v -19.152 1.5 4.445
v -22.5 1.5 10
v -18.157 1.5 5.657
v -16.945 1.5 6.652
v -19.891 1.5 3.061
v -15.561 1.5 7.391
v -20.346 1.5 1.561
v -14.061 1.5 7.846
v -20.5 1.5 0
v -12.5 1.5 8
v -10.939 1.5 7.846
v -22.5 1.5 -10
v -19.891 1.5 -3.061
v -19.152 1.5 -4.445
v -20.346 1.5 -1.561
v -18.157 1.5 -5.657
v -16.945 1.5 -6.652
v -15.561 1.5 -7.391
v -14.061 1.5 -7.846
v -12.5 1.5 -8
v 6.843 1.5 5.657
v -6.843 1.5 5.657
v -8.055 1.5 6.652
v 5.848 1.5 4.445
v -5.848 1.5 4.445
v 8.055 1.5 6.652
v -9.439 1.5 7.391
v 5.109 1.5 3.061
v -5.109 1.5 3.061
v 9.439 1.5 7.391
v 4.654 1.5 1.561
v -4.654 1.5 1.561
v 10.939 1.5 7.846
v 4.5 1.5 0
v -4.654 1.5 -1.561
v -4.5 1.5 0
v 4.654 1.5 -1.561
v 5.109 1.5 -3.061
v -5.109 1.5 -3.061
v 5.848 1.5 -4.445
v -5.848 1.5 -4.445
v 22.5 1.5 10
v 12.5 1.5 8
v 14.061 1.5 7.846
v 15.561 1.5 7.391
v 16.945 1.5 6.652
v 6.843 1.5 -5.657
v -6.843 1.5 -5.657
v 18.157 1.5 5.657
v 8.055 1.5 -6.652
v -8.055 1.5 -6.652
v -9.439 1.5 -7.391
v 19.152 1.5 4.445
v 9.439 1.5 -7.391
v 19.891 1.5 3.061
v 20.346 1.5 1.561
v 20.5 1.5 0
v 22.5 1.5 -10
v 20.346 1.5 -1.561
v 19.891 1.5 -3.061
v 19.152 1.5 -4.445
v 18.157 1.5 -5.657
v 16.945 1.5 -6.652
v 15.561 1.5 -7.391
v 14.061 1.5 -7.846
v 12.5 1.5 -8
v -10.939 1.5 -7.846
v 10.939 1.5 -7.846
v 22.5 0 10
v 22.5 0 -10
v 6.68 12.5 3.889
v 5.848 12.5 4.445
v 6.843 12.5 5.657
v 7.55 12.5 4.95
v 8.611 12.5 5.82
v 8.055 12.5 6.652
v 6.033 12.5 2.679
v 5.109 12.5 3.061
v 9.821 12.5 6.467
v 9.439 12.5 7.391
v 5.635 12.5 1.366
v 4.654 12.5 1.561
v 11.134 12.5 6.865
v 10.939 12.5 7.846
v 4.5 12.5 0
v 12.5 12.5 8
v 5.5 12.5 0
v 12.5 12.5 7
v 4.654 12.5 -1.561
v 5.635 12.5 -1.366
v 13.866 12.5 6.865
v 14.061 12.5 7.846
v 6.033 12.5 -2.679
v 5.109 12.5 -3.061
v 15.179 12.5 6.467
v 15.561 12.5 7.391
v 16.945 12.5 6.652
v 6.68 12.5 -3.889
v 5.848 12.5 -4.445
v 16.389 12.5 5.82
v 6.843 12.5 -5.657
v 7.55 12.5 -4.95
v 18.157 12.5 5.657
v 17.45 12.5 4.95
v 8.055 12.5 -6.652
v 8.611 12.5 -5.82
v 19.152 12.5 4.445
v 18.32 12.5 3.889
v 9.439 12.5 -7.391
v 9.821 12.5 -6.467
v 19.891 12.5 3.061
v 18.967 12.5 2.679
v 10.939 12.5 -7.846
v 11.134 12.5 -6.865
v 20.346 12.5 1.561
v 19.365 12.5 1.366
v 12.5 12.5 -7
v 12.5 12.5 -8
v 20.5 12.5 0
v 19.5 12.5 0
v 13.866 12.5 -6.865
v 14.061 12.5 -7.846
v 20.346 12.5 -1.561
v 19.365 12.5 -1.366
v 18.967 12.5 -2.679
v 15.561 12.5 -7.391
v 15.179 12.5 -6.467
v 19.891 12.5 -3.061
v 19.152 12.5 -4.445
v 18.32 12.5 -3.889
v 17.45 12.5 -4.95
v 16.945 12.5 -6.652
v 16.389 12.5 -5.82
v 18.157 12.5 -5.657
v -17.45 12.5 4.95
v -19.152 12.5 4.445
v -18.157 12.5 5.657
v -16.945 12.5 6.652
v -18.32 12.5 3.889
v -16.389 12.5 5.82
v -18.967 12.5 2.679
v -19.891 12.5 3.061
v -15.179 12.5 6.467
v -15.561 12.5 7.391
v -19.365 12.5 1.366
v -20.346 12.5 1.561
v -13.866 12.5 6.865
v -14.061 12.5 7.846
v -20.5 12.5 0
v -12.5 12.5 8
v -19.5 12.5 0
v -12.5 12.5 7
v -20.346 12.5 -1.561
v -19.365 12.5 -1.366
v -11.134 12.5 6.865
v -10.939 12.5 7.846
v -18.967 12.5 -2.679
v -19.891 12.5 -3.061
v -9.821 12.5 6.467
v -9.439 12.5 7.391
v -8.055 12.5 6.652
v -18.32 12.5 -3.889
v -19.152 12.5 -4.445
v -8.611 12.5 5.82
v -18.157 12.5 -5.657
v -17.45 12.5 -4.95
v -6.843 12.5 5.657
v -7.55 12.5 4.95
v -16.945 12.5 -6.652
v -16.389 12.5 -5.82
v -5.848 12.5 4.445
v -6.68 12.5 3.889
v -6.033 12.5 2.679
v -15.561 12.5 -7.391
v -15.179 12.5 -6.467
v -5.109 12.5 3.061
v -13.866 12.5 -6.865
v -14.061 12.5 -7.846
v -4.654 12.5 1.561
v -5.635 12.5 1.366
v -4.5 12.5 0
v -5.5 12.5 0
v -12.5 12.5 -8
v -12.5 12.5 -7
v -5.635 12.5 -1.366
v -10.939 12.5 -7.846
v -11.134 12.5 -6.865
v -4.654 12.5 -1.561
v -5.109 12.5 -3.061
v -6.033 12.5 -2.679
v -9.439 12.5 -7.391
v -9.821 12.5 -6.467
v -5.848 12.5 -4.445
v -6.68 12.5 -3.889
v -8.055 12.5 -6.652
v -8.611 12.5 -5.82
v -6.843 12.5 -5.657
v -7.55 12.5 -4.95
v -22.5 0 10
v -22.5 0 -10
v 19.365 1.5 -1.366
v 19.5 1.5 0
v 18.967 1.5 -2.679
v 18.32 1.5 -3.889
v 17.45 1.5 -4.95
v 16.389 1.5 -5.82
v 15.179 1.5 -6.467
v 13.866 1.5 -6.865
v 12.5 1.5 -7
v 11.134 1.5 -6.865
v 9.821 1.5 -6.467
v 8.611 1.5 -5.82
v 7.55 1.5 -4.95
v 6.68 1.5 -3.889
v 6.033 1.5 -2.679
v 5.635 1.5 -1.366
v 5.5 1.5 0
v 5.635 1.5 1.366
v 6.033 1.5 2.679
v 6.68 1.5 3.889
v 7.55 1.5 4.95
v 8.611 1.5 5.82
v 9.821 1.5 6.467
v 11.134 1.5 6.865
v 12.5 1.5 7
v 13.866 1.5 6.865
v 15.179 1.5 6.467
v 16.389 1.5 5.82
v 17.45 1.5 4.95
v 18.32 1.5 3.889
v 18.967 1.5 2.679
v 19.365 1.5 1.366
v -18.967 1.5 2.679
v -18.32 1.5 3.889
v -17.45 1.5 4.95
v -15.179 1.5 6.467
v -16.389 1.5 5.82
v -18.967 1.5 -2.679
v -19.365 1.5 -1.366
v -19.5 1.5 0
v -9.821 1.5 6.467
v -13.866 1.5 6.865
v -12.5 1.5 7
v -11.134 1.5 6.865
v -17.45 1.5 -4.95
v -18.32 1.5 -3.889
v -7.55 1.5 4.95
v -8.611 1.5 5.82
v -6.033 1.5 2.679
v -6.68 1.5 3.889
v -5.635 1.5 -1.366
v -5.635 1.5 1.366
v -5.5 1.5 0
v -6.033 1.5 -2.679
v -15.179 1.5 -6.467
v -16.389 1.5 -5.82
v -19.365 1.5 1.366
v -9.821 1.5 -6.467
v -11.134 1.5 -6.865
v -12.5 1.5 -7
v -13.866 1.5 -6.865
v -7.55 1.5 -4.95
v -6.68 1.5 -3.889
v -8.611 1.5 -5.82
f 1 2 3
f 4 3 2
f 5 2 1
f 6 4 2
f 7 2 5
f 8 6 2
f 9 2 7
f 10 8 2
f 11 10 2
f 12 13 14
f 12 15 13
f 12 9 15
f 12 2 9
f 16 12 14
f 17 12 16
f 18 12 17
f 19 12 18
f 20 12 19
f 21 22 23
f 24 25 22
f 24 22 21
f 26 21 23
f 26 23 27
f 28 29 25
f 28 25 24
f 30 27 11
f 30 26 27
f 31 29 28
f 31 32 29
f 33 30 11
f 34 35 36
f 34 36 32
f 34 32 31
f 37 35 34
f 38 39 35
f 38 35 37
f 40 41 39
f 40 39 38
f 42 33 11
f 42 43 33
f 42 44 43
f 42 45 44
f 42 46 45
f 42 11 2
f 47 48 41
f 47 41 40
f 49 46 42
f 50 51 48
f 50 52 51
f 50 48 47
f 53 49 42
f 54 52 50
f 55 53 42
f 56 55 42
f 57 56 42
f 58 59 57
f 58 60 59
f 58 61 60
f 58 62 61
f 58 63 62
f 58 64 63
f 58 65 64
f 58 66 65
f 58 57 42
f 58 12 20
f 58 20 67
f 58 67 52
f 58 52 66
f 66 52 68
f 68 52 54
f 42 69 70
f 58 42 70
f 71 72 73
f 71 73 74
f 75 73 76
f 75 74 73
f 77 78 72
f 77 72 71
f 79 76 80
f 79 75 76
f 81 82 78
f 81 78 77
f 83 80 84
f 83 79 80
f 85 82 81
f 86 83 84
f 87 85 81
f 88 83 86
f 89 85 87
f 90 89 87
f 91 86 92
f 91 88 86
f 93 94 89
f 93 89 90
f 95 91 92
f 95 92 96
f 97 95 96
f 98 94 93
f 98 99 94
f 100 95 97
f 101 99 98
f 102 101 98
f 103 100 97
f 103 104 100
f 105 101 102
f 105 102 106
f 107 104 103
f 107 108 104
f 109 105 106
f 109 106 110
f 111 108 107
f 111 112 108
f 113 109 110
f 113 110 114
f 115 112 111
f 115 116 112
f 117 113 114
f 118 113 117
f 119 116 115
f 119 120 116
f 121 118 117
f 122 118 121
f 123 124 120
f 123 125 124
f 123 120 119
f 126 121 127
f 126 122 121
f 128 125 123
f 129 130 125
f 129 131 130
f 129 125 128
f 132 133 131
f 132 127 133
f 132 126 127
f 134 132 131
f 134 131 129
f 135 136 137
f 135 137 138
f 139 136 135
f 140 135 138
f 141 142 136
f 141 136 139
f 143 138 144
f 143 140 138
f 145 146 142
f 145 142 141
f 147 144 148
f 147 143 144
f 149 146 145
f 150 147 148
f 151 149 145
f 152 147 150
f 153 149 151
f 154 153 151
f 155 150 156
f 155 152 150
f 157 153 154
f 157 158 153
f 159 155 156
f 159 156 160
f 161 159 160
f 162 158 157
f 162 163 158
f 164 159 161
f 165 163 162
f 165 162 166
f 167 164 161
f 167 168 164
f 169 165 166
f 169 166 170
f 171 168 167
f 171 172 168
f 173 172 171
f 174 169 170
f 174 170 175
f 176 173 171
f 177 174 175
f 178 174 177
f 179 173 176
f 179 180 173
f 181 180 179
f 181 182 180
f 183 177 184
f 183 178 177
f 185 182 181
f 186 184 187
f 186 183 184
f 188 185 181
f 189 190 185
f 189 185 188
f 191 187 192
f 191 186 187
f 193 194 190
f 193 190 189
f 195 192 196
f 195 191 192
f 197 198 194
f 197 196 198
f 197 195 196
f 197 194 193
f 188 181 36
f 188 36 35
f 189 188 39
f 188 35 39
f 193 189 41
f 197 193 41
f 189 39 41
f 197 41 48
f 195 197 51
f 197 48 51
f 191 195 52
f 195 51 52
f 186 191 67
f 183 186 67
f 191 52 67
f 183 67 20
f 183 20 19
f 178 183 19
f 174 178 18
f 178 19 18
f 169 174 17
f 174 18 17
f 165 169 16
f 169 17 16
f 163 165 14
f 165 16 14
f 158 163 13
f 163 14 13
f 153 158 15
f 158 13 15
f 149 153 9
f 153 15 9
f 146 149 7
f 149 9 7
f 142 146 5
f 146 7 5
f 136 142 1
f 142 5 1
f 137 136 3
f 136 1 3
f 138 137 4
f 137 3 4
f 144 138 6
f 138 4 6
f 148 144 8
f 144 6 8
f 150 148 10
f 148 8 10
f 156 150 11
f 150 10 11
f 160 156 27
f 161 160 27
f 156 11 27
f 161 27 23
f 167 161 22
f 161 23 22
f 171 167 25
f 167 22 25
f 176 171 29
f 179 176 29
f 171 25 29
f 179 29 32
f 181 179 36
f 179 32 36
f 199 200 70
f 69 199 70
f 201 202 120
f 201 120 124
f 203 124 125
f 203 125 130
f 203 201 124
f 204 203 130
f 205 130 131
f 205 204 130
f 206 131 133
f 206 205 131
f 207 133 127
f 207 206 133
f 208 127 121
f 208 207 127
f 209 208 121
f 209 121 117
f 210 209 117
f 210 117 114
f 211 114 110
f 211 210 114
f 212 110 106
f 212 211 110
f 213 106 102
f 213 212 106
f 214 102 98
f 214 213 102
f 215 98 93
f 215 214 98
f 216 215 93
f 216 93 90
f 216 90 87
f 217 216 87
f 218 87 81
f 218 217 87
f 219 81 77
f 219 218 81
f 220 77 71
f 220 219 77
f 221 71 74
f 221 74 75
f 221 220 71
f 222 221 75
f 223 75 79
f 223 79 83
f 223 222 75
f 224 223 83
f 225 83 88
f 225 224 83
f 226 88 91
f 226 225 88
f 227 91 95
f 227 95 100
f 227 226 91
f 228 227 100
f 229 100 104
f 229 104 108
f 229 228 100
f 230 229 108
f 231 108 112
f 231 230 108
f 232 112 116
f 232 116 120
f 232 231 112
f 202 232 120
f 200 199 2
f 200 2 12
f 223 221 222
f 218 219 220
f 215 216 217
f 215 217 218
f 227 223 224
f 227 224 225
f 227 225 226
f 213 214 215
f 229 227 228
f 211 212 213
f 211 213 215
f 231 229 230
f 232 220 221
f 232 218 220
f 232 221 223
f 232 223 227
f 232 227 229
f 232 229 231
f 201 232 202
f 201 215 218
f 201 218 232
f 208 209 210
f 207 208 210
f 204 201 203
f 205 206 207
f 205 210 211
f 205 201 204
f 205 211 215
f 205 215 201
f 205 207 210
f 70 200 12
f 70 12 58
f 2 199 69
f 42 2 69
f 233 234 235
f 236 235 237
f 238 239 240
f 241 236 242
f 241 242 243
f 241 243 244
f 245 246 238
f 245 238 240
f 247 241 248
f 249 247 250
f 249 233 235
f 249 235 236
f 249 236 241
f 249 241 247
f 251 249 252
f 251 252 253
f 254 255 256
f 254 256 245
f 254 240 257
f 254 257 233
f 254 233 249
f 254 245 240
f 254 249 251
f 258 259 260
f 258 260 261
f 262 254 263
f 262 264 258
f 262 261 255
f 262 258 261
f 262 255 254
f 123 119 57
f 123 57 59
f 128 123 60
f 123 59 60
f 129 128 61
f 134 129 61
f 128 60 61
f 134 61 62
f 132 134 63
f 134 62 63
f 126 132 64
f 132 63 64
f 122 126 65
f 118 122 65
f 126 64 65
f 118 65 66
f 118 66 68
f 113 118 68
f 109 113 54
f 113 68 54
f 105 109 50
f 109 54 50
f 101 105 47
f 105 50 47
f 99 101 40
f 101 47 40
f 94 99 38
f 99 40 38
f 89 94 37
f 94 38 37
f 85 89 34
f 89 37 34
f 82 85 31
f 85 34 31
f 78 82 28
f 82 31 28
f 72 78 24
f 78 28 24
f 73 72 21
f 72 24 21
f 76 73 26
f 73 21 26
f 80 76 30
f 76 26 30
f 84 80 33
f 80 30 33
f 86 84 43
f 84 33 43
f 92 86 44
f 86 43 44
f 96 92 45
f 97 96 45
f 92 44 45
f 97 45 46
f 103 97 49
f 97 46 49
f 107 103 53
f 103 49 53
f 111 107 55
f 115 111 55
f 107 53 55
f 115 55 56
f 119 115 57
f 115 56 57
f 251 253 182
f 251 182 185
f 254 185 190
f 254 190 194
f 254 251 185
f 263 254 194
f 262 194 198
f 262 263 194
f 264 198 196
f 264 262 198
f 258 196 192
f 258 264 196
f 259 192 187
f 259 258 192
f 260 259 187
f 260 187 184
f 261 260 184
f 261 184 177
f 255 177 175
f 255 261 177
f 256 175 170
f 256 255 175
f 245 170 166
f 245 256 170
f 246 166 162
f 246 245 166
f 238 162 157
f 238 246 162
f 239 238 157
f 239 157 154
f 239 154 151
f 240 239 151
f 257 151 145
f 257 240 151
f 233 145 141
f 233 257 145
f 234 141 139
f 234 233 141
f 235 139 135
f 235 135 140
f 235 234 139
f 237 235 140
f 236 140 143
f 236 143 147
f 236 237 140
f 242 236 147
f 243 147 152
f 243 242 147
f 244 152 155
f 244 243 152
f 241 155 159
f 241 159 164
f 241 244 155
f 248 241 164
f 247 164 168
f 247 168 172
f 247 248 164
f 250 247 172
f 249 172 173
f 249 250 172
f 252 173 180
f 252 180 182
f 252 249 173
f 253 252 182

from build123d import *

# Parameters (mm, degrees)
SKETCH1_W           = 45
SKETCH1_H           = 20
BOSS_EXTRUDE1_DEPTH = 1.5
SKETCH3_R           = 8
SKETCH3_R_2         = 7
BOSS_EXTRUDE2_DEPTH = 11


with BuildPart() as part:
    # Sketch1 → Boss-Extrude1 (new body)
    with BuildSketch(Plane(origin=(0, 0, 0), x_dir=(1, 0, 0), z_dir=(0, 1, 0))):
        Rectangle(SKETCH1_W, SKETCH1_H)
    extrude(amount=BOSS_EXTRUDE1_DEPTH)

    # Sketch3 → Boss-Extrude2 (add)
    with BuildSketch(Plane(origin=(0, 1.5, 0), x_dir=(1, 0, 0), z_dir=(0, 1, 0))):
        with Locations((-12.5, 0)):
            Circle(SKETCH3_R)
        with Locations((-12.5, 0)):
            Circle(SKETCH3_R_2, mode=Mode.SUBTRACT)
        with Locations((12.5, 0)):
            Circle(SKETCH3_R)
        with Locations((12.5, 0)):
            Circle(SKETCH3_R_2, mode=Mode.SUBTRACT)
    extrude(amount=BOSS_EXTRUDE2_DEPTH)


solid = part.part
